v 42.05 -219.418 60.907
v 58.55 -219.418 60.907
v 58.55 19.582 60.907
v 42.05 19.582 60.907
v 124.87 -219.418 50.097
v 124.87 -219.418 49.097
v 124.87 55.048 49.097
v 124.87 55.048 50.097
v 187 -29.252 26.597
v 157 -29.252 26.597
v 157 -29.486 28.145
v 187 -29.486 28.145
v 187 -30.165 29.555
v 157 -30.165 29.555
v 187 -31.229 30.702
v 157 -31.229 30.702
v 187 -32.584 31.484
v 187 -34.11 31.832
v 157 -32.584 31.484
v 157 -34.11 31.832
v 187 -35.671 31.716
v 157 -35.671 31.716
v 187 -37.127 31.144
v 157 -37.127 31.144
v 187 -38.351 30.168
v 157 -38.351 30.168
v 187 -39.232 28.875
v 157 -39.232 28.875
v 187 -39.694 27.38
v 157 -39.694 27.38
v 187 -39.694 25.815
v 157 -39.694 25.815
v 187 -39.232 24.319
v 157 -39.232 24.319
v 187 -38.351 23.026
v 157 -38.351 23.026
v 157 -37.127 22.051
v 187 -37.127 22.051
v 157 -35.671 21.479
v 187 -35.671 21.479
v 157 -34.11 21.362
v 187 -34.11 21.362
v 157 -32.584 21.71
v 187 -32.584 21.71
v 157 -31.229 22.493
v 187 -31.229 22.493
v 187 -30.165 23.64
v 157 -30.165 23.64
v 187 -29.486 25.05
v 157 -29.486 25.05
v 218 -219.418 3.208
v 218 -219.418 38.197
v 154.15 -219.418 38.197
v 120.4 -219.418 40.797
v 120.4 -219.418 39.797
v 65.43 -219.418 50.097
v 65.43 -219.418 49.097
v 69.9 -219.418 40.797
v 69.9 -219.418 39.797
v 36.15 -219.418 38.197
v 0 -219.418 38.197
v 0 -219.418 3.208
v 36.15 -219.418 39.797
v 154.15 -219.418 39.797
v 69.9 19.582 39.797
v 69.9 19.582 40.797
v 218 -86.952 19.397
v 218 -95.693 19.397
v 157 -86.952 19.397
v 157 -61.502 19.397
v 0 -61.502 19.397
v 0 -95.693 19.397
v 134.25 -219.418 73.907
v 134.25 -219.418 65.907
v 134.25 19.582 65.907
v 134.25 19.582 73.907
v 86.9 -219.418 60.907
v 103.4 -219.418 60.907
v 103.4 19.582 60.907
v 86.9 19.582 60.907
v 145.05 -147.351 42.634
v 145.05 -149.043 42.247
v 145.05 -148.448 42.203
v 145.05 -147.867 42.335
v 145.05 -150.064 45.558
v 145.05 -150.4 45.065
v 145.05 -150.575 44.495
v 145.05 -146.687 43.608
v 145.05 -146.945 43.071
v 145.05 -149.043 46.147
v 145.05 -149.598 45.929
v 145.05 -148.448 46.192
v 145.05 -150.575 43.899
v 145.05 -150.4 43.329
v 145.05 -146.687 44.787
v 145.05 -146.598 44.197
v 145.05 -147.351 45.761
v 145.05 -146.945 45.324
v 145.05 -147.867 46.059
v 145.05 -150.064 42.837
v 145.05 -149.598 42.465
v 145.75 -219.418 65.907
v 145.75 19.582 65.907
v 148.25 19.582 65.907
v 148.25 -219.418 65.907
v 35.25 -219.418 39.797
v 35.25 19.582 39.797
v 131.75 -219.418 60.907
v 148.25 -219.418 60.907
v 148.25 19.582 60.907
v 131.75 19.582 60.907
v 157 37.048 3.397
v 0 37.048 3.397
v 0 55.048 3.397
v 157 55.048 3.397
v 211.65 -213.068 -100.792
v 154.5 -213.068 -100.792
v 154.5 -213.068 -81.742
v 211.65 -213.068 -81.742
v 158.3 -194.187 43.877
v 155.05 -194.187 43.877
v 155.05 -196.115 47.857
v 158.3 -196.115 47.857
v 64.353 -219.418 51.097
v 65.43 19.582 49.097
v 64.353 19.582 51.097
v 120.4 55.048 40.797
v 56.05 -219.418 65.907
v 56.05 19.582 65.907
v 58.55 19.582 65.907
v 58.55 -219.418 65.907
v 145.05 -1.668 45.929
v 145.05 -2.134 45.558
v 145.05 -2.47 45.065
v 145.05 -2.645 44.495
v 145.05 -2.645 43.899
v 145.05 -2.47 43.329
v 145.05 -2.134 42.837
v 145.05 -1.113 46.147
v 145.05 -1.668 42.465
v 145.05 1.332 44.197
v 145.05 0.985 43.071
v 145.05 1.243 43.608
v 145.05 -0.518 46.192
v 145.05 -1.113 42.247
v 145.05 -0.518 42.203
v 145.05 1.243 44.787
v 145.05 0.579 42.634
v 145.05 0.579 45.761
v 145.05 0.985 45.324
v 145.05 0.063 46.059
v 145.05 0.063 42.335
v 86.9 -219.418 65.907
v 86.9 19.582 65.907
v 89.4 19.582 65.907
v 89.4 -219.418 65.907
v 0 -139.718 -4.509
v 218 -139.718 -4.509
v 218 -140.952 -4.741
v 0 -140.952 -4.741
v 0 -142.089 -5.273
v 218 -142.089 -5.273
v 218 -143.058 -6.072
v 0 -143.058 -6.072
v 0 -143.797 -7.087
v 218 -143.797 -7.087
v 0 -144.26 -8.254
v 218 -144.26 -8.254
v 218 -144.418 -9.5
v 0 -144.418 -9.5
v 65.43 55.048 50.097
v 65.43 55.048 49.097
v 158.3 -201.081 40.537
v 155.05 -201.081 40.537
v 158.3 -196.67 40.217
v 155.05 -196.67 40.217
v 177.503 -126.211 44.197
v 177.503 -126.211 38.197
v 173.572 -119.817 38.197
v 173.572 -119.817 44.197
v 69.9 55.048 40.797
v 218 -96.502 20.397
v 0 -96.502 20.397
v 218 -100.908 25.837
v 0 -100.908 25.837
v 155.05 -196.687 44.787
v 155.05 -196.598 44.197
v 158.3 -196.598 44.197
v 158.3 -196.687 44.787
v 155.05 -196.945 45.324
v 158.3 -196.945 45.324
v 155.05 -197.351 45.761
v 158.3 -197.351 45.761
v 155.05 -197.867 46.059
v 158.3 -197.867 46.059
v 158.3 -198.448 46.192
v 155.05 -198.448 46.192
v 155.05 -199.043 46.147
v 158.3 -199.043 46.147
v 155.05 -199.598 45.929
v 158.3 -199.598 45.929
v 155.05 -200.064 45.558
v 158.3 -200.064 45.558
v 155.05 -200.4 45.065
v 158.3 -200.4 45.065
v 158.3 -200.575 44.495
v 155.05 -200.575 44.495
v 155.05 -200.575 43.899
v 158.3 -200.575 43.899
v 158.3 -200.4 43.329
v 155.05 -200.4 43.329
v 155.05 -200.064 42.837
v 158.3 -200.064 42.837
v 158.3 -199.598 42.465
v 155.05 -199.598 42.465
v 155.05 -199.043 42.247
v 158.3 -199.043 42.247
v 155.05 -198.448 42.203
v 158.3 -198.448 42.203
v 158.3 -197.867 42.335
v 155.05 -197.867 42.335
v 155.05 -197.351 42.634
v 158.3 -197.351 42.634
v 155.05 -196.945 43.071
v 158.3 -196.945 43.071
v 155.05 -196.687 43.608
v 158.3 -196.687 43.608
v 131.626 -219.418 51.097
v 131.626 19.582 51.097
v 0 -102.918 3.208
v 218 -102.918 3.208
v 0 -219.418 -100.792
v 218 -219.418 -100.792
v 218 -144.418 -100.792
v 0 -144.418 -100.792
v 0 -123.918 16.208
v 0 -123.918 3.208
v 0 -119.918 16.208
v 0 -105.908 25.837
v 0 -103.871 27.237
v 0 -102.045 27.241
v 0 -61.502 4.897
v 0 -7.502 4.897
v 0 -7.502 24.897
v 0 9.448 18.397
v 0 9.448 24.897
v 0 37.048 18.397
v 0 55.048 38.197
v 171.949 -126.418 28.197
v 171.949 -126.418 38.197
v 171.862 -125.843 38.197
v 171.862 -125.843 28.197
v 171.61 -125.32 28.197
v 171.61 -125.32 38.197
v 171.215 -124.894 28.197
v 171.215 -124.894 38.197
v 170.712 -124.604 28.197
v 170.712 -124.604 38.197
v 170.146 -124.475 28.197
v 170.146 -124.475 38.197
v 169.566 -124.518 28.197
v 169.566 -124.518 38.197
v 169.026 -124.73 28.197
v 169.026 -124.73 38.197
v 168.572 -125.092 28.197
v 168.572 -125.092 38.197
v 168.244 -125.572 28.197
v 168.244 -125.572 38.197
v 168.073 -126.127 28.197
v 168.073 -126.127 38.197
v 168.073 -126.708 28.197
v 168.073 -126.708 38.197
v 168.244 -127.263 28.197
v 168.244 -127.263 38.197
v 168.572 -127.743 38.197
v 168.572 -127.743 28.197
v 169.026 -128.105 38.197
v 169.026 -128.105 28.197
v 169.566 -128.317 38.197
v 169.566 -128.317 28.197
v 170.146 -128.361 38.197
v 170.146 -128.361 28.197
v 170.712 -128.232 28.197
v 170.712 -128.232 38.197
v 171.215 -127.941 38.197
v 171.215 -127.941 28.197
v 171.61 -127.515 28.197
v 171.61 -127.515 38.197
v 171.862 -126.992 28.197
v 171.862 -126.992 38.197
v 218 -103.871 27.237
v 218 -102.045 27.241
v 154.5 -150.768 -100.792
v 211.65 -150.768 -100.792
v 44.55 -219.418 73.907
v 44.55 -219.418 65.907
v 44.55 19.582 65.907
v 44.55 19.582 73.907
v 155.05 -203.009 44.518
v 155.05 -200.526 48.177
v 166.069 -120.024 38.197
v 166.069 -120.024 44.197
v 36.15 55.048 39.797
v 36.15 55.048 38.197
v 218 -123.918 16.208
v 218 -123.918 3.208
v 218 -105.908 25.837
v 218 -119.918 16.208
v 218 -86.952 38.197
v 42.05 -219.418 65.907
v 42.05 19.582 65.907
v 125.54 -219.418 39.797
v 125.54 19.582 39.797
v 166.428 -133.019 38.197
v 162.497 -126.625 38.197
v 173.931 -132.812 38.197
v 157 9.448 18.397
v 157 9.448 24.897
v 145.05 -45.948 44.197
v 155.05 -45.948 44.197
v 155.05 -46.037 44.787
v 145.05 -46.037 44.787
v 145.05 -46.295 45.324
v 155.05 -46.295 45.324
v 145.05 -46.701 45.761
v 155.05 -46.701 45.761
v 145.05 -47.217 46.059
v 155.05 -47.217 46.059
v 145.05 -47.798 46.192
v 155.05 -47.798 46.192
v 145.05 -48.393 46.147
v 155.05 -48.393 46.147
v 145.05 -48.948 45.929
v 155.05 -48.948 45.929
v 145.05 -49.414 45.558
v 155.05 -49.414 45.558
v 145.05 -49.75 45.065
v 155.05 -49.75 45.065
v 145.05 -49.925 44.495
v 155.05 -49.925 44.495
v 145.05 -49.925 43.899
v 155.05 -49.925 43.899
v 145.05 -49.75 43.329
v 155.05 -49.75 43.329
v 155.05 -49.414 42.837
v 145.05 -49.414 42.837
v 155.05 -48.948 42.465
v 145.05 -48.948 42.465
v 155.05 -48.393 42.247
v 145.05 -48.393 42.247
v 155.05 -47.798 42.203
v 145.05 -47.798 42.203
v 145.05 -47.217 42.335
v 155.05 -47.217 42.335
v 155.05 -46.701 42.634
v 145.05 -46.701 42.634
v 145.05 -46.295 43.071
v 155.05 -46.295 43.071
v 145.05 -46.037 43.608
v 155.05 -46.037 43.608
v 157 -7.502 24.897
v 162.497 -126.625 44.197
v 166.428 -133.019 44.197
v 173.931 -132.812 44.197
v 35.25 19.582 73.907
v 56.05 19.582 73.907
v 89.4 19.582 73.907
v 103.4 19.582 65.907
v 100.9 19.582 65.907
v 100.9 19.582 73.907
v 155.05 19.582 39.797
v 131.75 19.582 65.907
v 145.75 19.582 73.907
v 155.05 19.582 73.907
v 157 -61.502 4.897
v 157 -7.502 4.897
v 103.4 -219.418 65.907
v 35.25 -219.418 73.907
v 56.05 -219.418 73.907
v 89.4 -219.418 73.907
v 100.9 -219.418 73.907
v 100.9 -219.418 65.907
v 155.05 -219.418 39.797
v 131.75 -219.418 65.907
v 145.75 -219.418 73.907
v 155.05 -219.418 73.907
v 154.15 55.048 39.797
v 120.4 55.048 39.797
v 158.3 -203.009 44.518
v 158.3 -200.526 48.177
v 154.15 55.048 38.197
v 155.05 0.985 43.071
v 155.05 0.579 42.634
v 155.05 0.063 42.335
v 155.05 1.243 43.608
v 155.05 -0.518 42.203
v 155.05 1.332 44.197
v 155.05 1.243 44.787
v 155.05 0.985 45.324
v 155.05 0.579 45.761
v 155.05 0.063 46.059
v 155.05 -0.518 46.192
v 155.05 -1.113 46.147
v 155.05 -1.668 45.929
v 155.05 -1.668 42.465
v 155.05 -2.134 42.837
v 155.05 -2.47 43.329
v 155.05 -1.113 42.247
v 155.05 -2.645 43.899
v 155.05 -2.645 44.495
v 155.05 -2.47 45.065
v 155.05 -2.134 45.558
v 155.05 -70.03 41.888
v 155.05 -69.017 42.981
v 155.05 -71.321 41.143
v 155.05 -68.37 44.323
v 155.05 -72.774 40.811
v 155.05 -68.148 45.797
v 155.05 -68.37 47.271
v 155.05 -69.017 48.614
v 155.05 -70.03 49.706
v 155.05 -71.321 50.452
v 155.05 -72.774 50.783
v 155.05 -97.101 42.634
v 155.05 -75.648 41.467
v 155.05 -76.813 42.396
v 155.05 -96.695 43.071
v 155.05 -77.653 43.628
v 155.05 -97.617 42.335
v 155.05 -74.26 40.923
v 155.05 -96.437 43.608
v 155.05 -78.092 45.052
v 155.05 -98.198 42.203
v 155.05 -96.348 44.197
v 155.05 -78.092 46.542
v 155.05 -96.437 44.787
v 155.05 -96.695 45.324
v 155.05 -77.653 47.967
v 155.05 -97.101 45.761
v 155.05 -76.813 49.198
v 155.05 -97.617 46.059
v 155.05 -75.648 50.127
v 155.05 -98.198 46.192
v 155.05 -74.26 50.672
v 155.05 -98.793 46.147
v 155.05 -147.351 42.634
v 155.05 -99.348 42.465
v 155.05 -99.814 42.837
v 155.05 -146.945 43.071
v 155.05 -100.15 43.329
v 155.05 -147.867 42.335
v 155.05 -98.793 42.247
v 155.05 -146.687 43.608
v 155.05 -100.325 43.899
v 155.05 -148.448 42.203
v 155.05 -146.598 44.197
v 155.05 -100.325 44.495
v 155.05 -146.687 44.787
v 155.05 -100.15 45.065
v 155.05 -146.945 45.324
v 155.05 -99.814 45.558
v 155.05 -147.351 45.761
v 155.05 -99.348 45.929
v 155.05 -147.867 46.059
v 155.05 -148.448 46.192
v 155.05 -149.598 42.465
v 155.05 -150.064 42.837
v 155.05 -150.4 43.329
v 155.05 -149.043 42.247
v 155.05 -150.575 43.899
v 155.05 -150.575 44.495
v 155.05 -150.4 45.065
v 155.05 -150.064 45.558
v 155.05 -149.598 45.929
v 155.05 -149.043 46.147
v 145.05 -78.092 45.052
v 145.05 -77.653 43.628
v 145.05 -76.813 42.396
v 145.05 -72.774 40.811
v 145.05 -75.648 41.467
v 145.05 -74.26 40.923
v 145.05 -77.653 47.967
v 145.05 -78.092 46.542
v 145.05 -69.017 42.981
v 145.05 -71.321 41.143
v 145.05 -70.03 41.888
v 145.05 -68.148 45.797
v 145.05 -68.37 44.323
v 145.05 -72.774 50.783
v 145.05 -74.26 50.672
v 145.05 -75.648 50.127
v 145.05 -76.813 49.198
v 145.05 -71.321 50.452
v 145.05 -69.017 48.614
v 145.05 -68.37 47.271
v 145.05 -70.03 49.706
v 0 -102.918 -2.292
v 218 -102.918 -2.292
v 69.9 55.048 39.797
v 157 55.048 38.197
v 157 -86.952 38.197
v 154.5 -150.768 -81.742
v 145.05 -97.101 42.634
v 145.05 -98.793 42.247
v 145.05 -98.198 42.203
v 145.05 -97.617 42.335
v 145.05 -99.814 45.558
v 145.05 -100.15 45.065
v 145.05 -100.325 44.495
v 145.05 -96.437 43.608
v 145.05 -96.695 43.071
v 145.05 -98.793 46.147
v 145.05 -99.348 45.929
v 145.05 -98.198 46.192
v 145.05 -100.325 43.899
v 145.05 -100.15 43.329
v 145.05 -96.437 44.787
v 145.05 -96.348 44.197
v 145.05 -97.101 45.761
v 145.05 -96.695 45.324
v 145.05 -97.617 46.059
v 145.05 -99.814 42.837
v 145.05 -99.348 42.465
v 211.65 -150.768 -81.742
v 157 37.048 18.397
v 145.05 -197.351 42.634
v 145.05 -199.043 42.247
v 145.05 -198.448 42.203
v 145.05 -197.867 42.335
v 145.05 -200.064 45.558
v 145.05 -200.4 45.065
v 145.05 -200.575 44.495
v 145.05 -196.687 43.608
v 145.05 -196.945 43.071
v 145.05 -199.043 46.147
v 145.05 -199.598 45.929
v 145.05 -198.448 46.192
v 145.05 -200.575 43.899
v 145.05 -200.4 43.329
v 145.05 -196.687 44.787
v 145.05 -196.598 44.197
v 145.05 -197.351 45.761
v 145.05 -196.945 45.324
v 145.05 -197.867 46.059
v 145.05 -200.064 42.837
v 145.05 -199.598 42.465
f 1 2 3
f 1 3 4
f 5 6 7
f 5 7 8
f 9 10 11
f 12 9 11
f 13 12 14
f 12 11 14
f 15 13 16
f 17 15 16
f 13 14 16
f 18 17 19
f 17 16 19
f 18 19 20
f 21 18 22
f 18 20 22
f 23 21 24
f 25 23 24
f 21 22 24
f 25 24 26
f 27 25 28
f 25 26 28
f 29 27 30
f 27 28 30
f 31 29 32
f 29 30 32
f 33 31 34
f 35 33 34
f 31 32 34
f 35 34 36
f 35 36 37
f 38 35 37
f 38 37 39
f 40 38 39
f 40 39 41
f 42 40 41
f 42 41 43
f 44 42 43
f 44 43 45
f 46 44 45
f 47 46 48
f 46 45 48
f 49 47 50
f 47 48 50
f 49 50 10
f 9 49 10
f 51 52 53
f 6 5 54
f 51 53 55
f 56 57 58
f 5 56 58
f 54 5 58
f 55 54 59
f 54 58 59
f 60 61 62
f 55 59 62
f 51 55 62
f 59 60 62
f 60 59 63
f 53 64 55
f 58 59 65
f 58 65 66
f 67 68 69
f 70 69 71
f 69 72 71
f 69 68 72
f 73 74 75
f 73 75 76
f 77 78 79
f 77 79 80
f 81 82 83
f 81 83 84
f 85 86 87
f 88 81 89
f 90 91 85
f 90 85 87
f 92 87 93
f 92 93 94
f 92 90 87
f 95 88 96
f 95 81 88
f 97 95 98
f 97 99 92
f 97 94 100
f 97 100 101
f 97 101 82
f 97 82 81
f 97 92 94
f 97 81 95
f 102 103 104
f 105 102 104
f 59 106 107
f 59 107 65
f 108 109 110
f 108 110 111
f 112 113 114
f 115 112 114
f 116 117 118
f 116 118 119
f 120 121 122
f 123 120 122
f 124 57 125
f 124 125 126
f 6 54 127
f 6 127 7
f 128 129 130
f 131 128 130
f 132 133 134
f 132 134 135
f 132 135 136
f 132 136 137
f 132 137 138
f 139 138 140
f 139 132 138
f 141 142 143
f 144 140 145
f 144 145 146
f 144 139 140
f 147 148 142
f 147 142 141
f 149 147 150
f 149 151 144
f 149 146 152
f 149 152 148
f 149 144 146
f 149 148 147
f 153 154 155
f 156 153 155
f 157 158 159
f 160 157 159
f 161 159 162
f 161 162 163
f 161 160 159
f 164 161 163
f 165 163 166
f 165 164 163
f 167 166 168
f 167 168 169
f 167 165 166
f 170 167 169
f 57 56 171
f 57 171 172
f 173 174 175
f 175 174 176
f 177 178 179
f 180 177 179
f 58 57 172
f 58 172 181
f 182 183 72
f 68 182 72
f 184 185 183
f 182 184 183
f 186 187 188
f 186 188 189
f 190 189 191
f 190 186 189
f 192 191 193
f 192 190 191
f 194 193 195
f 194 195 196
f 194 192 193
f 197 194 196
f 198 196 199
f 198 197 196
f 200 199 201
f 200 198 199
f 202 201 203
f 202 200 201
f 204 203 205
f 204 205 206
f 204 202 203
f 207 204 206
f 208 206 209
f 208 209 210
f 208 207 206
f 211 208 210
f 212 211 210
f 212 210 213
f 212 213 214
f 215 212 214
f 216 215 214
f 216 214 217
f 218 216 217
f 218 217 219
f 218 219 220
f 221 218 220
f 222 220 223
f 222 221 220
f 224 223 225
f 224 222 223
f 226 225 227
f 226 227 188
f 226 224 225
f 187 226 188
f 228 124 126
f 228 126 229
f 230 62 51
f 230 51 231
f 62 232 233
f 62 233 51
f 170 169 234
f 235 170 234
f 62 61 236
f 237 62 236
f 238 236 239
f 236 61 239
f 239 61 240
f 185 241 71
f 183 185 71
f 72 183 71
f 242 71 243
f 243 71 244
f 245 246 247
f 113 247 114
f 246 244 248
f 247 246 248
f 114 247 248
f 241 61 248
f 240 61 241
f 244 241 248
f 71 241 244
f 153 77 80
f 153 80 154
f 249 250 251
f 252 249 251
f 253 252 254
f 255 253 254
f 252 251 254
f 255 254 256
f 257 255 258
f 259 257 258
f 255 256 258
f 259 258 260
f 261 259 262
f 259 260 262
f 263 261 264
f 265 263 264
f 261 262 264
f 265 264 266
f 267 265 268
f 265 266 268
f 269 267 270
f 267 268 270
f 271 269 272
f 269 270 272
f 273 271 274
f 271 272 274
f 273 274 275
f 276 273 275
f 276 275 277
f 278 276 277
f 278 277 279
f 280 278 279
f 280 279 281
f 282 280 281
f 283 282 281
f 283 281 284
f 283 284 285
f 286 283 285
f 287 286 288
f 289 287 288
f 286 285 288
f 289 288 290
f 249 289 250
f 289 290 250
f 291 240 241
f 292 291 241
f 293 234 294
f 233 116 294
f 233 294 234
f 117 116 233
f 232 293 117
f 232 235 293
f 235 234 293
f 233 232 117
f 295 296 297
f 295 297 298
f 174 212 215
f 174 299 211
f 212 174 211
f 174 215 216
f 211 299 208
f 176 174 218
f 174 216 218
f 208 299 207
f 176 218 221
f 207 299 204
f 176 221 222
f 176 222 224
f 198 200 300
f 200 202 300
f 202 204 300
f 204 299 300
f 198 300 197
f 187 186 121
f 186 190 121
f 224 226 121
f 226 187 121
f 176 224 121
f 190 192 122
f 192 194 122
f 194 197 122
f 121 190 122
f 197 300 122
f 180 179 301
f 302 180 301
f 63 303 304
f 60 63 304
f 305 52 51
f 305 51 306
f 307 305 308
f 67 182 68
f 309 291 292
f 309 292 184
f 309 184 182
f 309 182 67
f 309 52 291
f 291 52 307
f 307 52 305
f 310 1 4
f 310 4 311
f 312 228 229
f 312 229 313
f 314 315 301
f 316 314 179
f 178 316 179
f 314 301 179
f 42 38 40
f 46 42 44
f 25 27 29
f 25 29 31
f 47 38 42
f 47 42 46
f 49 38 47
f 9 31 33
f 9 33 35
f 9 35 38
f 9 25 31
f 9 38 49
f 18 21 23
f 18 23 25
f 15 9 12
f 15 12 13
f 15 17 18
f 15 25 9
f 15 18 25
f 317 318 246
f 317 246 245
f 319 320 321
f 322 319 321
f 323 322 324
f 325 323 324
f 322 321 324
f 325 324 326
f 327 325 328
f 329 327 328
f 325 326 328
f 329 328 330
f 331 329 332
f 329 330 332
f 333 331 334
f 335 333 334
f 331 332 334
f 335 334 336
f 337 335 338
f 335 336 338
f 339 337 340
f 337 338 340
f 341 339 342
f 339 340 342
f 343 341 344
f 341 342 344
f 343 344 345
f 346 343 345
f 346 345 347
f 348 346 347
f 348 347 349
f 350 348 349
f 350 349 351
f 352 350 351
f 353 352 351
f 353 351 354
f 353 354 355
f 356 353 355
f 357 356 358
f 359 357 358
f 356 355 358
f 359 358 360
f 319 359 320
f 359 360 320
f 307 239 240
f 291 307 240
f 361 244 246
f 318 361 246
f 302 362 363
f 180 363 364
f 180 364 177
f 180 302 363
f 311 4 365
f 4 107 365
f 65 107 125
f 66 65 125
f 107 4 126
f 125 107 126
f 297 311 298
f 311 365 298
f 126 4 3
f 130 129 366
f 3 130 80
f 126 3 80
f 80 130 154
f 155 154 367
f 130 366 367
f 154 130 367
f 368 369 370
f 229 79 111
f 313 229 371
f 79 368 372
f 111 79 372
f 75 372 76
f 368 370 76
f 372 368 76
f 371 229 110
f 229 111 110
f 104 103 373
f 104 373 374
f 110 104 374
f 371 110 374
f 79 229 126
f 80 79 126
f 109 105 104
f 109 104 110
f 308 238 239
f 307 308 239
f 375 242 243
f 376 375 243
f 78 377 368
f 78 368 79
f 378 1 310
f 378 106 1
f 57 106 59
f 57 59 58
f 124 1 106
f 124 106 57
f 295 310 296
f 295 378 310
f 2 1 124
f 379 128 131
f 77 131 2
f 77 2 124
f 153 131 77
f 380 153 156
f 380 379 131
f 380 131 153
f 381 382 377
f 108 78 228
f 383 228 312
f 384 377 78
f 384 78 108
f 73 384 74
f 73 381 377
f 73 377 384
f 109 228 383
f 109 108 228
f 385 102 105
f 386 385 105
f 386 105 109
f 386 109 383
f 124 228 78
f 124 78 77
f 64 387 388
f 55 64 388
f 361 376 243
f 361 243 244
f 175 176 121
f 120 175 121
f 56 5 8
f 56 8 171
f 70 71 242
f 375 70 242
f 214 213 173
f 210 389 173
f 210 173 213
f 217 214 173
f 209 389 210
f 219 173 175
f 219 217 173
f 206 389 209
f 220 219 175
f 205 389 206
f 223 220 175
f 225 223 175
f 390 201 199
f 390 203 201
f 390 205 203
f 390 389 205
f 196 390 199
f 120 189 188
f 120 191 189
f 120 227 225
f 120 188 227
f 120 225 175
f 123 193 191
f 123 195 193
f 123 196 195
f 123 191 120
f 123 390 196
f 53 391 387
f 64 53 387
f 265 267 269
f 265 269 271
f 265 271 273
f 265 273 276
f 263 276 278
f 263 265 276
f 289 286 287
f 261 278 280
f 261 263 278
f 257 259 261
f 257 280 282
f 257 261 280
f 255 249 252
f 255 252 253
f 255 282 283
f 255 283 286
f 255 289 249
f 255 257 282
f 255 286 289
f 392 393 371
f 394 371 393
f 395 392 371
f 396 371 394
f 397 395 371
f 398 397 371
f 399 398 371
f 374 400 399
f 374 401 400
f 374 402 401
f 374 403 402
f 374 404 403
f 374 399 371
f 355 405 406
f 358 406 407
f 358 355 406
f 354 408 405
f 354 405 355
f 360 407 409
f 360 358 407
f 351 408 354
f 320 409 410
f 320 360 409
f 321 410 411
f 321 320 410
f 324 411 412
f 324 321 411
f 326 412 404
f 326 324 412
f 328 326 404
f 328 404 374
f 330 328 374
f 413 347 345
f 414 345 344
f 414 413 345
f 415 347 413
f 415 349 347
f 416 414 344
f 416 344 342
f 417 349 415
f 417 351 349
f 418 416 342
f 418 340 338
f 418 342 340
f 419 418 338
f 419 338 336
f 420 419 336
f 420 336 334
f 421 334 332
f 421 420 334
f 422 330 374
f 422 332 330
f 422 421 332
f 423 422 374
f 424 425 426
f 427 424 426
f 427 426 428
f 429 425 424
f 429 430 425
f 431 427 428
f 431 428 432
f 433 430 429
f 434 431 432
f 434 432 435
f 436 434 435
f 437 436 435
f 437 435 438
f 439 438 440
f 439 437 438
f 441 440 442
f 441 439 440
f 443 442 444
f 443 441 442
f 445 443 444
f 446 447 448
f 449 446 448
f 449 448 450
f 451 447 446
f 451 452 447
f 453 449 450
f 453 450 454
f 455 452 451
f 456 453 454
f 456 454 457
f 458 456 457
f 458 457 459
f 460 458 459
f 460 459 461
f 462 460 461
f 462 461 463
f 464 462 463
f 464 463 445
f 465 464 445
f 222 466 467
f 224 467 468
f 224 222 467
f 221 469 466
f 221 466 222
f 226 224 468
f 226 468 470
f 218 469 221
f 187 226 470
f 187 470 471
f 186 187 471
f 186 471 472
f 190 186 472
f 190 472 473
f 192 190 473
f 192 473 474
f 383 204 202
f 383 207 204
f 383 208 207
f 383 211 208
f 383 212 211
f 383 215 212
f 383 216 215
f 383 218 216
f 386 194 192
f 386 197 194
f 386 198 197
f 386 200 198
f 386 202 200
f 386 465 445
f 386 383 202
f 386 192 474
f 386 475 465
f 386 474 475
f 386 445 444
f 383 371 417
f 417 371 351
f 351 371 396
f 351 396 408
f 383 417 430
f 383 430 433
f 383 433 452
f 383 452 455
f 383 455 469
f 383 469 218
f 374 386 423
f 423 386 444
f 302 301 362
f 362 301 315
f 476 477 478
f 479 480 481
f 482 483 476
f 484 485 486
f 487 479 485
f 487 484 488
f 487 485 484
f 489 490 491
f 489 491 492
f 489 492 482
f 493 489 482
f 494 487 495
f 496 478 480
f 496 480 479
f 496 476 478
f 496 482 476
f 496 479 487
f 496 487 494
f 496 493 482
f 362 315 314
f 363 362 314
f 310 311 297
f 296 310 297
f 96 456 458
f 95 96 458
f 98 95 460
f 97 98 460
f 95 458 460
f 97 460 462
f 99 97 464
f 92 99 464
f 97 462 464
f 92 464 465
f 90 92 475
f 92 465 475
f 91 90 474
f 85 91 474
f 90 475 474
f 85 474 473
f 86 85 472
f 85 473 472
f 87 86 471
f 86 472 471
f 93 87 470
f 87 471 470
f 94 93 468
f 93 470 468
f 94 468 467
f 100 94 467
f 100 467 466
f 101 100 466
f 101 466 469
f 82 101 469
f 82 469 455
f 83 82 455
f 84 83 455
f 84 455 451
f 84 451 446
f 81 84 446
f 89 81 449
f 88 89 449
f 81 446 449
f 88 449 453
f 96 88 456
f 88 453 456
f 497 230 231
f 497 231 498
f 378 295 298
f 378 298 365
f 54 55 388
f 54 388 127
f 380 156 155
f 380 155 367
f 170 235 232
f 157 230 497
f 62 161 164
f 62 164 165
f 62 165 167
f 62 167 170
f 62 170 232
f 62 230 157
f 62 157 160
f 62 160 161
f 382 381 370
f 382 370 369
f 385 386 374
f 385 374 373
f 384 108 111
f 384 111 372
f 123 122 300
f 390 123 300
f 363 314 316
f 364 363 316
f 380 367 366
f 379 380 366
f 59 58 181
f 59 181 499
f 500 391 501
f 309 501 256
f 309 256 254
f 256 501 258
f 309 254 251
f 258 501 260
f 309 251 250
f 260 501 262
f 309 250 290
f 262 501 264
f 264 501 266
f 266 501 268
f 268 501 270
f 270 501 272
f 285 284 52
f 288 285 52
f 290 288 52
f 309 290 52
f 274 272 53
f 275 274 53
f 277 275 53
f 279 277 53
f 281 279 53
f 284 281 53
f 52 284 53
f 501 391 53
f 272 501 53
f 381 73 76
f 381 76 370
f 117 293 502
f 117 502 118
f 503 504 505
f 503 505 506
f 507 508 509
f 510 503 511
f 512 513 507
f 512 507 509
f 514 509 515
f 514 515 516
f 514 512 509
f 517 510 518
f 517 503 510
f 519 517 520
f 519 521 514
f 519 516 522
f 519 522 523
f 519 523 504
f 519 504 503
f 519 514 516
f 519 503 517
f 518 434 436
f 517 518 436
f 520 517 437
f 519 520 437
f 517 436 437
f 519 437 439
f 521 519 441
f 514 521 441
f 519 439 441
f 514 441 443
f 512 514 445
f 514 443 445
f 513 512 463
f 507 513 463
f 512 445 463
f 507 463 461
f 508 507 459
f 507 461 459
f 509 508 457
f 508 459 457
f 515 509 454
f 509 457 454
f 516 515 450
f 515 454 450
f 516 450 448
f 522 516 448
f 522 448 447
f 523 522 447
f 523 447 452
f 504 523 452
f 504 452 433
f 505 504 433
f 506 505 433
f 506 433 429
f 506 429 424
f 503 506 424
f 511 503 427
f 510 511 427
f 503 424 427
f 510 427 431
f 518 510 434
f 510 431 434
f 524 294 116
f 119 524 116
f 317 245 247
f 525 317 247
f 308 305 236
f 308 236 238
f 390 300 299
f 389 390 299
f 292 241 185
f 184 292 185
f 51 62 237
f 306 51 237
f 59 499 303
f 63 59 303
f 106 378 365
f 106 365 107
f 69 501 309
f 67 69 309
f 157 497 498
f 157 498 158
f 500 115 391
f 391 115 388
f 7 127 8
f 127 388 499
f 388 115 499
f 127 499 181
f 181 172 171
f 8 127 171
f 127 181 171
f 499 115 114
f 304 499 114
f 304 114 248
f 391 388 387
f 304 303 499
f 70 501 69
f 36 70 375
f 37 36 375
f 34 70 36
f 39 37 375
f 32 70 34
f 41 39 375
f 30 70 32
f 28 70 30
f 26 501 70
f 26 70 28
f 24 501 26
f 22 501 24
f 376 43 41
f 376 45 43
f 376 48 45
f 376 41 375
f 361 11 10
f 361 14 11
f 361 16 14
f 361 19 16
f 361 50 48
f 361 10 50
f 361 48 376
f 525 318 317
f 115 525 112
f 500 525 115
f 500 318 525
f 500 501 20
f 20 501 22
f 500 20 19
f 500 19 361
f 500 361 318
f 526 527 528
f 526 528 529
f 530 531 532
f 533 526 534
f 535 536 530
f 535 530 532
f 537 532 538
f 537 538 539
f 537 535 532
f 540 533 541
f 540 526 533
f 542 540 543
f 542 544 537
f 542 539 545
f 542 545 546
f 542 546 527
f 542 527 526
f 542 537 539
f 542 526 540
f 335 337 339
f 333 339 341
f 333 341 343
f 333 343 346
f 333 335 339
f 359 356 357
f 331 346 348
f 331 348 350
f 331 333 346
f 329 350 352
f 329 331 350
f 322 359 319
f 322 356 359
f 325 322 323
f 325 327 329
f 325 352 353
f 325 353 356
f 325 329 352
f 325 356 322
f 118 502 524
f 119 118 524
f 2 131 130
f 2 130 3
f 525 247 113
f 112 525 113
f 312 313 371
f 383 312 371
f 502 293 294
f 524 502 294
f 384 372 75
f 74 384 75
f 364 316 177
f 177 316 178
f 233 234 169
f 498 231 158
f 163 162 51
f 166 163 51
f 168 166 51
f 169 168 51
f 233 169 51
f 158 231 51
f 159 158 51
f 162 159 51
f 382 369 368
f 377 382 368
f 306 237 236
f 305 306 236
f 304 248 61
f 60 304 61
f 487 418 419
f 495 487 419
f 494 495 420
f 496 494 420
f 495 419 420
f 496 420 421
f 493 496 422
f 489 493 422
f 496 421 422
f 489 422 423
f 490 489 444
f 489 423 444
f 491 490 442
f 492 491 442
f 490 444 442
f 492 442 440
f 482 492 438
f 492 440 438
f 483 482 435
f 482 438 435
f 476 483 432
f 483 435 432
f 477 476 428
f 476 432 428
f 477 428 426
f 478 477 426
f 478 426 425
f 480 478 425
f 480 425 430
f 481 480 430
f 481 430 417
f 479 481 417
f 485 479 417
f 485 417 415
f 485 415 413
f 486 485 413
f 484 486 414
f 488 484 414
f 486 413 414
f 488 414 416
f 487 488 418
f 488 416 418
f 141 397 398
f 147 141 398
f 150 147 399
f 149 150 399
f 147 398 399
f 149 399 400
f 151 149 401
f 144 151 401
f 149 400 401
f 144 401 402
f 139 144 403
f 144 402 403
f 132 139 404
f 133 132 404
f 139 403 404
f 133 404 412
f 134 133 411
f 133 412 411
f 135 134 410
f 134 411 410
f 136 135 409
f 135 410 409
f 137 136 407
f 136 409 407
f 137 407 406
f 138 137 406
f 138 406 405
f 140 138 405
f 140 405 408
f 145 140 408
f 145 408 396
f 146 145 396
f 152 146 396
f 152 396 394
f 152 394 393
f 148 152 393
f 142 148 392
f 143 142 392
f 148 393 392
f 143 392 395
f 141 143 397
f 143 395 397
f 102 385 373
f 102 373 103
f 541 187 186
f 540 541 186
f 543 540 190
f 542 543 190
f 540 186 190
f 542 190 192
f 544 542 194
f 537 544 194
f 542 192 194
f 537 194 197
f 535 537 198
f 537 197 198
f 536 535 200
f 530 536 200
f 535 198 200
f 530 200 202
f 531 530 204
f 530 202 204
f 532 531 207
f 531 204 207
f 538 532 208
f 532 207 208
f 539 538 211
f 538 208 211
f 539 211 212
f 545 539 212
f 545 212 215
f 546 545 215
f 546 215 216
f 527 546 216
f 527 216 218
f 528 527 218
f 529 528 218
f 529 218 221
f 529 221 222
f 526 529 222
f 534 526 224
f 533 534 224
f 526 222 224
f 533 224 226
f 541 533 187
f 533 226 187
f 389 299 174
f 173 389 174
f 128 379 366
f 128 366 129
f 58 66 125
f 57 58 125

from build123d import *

# Parameters (mm, degrees)
F1_DEPTH  = 218
F3_DEPTH  = 274.465388
F4_W      = 61
F4_H      = 142
F5_DEPTH  = 34.8
F7_DEPTH  = 239
F8_R      = 5.25
F9_DEPTH  = 30
F10_R     = 2
F10_R_2   = 5
F11_DEPTH = 10
F12_DEPTH = 3.25
F13_R     = 1.948588
F14_DEPTH = 6
F15_DEPTH = 10
F17_DEPTH = 218
F18_W     = 57.150004
F18_H     = 62.300008
F19_DEPTH = 19.05


with BuildPart() as f1:
    # F0 (on Right) → F1 (new body)
    with BuildSketch(Plane.YZ):
        Polygon((34.047622, 18.397166), (37.047622, 18.397166), (37.047622, 3.397166), (55.047622, 3.397166), (55.047622, 38.197166), (-219.417766, 38.197166), (-219.417766, 16.208281), (-219.417766, 3.208281), (-123.917766, 3.208281), (-123.917766, 16.208281), (-119.917766, 16.208281), (-105.907621, 25.837187), (-103.871255, 27.236743), (-102.044701, 27.241364), (-100.907621, 25.837187), (-96.502378, 20.397166), (-95.692594, 19.397166), (-61.502378, 19.397166), (-61.502378, 4.897166), (-7.502378, 4.897166), (-7.502378, 19.052115), (-7.502378, 24.897166), (9.447622, 24.897166), (9.447622, 18.397166), (11.297622, 18.397166), align=None)
    extrude(amount=F1_DEPTH)

    # F2 (on face) → F3 (join, through all)
    with BuildSketch(Plane.XZ.offset(219.417766)):
        Polygon((69.9, 39.797166), (36.15, 39.797166), (36.15, 38.197166), (154.15, 38.197166), (154.15, 39.797166), (120.4, 39.797166), align=None)
        Polygon((69.9, 40.797166), (69.9, 39.797166), (120.4, 39.797166), (120.4, 40.797166), (124.87, 49.097166), (124.87, 50.097166), (95.15, 50.097166), (65.43, 50.097166), (65.43, 49.097166), align=None)
    extrude(amount=-F3_DEPTH)

    # F4 (on face) → F5 (cut, through all)
    with BuildSketch(Plane.XY.offset(38.197166)):
        with Locations((187.5, -15.952378)):
            Rectangle(F4_W, F4_H)
    extrude(amount=-F5_DEPTH, mode=Mode.SUBTRACT)

    # F8 (on face) → F9 (join)
    with BuildSketch(Plane.YZ.offset(157)):
        with Locations((-34.502378, 26.597166)):
            Circle(F8_R)
    extrude(amount=F9_DEPTH)

    # F13 (on face) → F15 (cut)
    with BuildSketch(Plane.XY.offset(38.197166)):
        with Locations((170, -126.417766)):
            Circle(F13_R)
    extrude(amount=-F15_DEPTH, mode=Mode.SUBTRACT)


with BuildPart() as f7:
    # F6 (on face) → F7 (new body)
    with BuildSketch(Plane.XZ.offset(219.417766)):
        Polygon((35.25, 73.907166), (35.25, 39.797166), (36.15, 39.797166), (69.9, 39.797166), (69.9, 40.797166), (65.43, 49.097166), (64.352892, 51.097166), (131.626103, 51.097166), (125.540441, 39.797166), (154.15, 39.797166), (155.05, 39.797166), (155.05, 73.907166), (145.75, 73.907166), (145.75, 65.907166), (148.25, 65.907166), (148.25, 60.907166), (131.75, 60.907166), (131.75, 65.907166), (134.25, 65.907166), (134.25, 73.907166), (100.9, 73.907166), (100.9, 65.907166), (103.4, 65.907166), (103.4, 60.907166), (86.9, 60.907166), (86.9, 65.907166), (89.4, 65.907166), (89.4, 73.907166), (56.05, 73.907166), (56.05, 65.907166), (58.55, 65.907166), (58.55, 60.907166), (42.05, 60.907166), (42.05, 65.907166), (44.55, 65.907166), (44.55, 73.907166), align=None)
    extrude(amount=-F7_DEPTH)

    # F10 (on face) → F11 (cut)
    with BuildSketch(Plane.YZ.offset(155.05)):
        with Locations((-198.597766, 44.197166)):
            Circle(F10_R)
        with Locations((-148.597766, 44.197166)):
            Circle(F10_R)
        with Locations((-98.347766, 44.197166)):
            Circle(F10_R)
        with Locations((-47.947766, 44.197166)):
            Circle(F10_R)
        with Locations((-0.667766, 44.197166)):
            Circle(F10_R)
        with Locations((-73.147766, 45.797166)):
            Circle(F10_R_2)
    extrude(amount=-F11_DEPTH, mode=Mode.SUBTRACT)


with BuildPart() as f12:
    # F10 (on face) → F12 (new body)
    with BuildSketch(Plane.YZ.offset(155.05)):
        Polygon((-194.186882, 43.876795), (-196.114875, 47.856917), (-200.525758, 48.177289), (-203.00865, 44.517537), (-201.080658, 40.537414), (-196.669774, 40.217043), align=None)
        with Locations((-198.597766, 44.197166)):
            Circle(F10_R, mode=Mode.SUBTRACT)
    extrude(amount=F12_DEPTH)


with BuildPart() as f14:
    # F13 (on face) → F14 (new body)
    with BuildSketch(Plane.XY.offset(38.197166)):
        Polygon((177.502694, -126.210592), (173.571929, -119.816656), (166.069235, -120.02383), (162.497306, -126.62494), (166.428071, -133.018876), (173.930765, -132.811702), align=None)
        with Locations((170, -126.417766)):
            Circle(F13_R, mode=Mode.SUBTRACT)
        with Locations((170, -126.417766)):
            Circle(F13_R)
    extrude(amount=F14_DEPTH)


with BuildPart() as f17:
    # F16 (on face) → F17 (new body, through all)
    with BuildSketch(Plane(origin=(0, 0, 0), x_dir=(0, -1, 0), z_dir=(-1, 0, 0))):
        with BuildLine():
            Line((219.417766, -100.791719), (219.417766, 3.208281))
            Line((219.417766, 3.208281), (123.917766, 3.208281))
            Line((123.917766, 3.208281), (102.917766, 3.208281))
            Line((102.917766, 3.208281), (102.917766, -2.291719))
            Line((102.917766, -2.291719), (139.718426, -4.508626))
            ThreePointArc((139.718426, -4.508626), (143.058048, -6.071991), (144.417766, -9.499578))
            Line((144.417766, -9.499578), (144.417766, -100.791719))
            Line((144.417766, -100.791719), (219.417766, -100.791719))
        make_face()
    extrude(amount=-F17_DEPTH)

    # F18 (on face) → F19 (cut)
    with BuildSketch(Plane(origin=(0, 0, -100.791719), x_dir=(1, 0, 0), z_dir=(0, 0, -1))):
        with Locations((183.075002, 181.917766)):
            Rectangle(F18_W, F18_H)
    extrude(amount=-F19_DEPTH, mode=Mode.SUBTRACT)


solid = Compound([f1.part, f7.part, f12.part, f14.part, f17.part])
